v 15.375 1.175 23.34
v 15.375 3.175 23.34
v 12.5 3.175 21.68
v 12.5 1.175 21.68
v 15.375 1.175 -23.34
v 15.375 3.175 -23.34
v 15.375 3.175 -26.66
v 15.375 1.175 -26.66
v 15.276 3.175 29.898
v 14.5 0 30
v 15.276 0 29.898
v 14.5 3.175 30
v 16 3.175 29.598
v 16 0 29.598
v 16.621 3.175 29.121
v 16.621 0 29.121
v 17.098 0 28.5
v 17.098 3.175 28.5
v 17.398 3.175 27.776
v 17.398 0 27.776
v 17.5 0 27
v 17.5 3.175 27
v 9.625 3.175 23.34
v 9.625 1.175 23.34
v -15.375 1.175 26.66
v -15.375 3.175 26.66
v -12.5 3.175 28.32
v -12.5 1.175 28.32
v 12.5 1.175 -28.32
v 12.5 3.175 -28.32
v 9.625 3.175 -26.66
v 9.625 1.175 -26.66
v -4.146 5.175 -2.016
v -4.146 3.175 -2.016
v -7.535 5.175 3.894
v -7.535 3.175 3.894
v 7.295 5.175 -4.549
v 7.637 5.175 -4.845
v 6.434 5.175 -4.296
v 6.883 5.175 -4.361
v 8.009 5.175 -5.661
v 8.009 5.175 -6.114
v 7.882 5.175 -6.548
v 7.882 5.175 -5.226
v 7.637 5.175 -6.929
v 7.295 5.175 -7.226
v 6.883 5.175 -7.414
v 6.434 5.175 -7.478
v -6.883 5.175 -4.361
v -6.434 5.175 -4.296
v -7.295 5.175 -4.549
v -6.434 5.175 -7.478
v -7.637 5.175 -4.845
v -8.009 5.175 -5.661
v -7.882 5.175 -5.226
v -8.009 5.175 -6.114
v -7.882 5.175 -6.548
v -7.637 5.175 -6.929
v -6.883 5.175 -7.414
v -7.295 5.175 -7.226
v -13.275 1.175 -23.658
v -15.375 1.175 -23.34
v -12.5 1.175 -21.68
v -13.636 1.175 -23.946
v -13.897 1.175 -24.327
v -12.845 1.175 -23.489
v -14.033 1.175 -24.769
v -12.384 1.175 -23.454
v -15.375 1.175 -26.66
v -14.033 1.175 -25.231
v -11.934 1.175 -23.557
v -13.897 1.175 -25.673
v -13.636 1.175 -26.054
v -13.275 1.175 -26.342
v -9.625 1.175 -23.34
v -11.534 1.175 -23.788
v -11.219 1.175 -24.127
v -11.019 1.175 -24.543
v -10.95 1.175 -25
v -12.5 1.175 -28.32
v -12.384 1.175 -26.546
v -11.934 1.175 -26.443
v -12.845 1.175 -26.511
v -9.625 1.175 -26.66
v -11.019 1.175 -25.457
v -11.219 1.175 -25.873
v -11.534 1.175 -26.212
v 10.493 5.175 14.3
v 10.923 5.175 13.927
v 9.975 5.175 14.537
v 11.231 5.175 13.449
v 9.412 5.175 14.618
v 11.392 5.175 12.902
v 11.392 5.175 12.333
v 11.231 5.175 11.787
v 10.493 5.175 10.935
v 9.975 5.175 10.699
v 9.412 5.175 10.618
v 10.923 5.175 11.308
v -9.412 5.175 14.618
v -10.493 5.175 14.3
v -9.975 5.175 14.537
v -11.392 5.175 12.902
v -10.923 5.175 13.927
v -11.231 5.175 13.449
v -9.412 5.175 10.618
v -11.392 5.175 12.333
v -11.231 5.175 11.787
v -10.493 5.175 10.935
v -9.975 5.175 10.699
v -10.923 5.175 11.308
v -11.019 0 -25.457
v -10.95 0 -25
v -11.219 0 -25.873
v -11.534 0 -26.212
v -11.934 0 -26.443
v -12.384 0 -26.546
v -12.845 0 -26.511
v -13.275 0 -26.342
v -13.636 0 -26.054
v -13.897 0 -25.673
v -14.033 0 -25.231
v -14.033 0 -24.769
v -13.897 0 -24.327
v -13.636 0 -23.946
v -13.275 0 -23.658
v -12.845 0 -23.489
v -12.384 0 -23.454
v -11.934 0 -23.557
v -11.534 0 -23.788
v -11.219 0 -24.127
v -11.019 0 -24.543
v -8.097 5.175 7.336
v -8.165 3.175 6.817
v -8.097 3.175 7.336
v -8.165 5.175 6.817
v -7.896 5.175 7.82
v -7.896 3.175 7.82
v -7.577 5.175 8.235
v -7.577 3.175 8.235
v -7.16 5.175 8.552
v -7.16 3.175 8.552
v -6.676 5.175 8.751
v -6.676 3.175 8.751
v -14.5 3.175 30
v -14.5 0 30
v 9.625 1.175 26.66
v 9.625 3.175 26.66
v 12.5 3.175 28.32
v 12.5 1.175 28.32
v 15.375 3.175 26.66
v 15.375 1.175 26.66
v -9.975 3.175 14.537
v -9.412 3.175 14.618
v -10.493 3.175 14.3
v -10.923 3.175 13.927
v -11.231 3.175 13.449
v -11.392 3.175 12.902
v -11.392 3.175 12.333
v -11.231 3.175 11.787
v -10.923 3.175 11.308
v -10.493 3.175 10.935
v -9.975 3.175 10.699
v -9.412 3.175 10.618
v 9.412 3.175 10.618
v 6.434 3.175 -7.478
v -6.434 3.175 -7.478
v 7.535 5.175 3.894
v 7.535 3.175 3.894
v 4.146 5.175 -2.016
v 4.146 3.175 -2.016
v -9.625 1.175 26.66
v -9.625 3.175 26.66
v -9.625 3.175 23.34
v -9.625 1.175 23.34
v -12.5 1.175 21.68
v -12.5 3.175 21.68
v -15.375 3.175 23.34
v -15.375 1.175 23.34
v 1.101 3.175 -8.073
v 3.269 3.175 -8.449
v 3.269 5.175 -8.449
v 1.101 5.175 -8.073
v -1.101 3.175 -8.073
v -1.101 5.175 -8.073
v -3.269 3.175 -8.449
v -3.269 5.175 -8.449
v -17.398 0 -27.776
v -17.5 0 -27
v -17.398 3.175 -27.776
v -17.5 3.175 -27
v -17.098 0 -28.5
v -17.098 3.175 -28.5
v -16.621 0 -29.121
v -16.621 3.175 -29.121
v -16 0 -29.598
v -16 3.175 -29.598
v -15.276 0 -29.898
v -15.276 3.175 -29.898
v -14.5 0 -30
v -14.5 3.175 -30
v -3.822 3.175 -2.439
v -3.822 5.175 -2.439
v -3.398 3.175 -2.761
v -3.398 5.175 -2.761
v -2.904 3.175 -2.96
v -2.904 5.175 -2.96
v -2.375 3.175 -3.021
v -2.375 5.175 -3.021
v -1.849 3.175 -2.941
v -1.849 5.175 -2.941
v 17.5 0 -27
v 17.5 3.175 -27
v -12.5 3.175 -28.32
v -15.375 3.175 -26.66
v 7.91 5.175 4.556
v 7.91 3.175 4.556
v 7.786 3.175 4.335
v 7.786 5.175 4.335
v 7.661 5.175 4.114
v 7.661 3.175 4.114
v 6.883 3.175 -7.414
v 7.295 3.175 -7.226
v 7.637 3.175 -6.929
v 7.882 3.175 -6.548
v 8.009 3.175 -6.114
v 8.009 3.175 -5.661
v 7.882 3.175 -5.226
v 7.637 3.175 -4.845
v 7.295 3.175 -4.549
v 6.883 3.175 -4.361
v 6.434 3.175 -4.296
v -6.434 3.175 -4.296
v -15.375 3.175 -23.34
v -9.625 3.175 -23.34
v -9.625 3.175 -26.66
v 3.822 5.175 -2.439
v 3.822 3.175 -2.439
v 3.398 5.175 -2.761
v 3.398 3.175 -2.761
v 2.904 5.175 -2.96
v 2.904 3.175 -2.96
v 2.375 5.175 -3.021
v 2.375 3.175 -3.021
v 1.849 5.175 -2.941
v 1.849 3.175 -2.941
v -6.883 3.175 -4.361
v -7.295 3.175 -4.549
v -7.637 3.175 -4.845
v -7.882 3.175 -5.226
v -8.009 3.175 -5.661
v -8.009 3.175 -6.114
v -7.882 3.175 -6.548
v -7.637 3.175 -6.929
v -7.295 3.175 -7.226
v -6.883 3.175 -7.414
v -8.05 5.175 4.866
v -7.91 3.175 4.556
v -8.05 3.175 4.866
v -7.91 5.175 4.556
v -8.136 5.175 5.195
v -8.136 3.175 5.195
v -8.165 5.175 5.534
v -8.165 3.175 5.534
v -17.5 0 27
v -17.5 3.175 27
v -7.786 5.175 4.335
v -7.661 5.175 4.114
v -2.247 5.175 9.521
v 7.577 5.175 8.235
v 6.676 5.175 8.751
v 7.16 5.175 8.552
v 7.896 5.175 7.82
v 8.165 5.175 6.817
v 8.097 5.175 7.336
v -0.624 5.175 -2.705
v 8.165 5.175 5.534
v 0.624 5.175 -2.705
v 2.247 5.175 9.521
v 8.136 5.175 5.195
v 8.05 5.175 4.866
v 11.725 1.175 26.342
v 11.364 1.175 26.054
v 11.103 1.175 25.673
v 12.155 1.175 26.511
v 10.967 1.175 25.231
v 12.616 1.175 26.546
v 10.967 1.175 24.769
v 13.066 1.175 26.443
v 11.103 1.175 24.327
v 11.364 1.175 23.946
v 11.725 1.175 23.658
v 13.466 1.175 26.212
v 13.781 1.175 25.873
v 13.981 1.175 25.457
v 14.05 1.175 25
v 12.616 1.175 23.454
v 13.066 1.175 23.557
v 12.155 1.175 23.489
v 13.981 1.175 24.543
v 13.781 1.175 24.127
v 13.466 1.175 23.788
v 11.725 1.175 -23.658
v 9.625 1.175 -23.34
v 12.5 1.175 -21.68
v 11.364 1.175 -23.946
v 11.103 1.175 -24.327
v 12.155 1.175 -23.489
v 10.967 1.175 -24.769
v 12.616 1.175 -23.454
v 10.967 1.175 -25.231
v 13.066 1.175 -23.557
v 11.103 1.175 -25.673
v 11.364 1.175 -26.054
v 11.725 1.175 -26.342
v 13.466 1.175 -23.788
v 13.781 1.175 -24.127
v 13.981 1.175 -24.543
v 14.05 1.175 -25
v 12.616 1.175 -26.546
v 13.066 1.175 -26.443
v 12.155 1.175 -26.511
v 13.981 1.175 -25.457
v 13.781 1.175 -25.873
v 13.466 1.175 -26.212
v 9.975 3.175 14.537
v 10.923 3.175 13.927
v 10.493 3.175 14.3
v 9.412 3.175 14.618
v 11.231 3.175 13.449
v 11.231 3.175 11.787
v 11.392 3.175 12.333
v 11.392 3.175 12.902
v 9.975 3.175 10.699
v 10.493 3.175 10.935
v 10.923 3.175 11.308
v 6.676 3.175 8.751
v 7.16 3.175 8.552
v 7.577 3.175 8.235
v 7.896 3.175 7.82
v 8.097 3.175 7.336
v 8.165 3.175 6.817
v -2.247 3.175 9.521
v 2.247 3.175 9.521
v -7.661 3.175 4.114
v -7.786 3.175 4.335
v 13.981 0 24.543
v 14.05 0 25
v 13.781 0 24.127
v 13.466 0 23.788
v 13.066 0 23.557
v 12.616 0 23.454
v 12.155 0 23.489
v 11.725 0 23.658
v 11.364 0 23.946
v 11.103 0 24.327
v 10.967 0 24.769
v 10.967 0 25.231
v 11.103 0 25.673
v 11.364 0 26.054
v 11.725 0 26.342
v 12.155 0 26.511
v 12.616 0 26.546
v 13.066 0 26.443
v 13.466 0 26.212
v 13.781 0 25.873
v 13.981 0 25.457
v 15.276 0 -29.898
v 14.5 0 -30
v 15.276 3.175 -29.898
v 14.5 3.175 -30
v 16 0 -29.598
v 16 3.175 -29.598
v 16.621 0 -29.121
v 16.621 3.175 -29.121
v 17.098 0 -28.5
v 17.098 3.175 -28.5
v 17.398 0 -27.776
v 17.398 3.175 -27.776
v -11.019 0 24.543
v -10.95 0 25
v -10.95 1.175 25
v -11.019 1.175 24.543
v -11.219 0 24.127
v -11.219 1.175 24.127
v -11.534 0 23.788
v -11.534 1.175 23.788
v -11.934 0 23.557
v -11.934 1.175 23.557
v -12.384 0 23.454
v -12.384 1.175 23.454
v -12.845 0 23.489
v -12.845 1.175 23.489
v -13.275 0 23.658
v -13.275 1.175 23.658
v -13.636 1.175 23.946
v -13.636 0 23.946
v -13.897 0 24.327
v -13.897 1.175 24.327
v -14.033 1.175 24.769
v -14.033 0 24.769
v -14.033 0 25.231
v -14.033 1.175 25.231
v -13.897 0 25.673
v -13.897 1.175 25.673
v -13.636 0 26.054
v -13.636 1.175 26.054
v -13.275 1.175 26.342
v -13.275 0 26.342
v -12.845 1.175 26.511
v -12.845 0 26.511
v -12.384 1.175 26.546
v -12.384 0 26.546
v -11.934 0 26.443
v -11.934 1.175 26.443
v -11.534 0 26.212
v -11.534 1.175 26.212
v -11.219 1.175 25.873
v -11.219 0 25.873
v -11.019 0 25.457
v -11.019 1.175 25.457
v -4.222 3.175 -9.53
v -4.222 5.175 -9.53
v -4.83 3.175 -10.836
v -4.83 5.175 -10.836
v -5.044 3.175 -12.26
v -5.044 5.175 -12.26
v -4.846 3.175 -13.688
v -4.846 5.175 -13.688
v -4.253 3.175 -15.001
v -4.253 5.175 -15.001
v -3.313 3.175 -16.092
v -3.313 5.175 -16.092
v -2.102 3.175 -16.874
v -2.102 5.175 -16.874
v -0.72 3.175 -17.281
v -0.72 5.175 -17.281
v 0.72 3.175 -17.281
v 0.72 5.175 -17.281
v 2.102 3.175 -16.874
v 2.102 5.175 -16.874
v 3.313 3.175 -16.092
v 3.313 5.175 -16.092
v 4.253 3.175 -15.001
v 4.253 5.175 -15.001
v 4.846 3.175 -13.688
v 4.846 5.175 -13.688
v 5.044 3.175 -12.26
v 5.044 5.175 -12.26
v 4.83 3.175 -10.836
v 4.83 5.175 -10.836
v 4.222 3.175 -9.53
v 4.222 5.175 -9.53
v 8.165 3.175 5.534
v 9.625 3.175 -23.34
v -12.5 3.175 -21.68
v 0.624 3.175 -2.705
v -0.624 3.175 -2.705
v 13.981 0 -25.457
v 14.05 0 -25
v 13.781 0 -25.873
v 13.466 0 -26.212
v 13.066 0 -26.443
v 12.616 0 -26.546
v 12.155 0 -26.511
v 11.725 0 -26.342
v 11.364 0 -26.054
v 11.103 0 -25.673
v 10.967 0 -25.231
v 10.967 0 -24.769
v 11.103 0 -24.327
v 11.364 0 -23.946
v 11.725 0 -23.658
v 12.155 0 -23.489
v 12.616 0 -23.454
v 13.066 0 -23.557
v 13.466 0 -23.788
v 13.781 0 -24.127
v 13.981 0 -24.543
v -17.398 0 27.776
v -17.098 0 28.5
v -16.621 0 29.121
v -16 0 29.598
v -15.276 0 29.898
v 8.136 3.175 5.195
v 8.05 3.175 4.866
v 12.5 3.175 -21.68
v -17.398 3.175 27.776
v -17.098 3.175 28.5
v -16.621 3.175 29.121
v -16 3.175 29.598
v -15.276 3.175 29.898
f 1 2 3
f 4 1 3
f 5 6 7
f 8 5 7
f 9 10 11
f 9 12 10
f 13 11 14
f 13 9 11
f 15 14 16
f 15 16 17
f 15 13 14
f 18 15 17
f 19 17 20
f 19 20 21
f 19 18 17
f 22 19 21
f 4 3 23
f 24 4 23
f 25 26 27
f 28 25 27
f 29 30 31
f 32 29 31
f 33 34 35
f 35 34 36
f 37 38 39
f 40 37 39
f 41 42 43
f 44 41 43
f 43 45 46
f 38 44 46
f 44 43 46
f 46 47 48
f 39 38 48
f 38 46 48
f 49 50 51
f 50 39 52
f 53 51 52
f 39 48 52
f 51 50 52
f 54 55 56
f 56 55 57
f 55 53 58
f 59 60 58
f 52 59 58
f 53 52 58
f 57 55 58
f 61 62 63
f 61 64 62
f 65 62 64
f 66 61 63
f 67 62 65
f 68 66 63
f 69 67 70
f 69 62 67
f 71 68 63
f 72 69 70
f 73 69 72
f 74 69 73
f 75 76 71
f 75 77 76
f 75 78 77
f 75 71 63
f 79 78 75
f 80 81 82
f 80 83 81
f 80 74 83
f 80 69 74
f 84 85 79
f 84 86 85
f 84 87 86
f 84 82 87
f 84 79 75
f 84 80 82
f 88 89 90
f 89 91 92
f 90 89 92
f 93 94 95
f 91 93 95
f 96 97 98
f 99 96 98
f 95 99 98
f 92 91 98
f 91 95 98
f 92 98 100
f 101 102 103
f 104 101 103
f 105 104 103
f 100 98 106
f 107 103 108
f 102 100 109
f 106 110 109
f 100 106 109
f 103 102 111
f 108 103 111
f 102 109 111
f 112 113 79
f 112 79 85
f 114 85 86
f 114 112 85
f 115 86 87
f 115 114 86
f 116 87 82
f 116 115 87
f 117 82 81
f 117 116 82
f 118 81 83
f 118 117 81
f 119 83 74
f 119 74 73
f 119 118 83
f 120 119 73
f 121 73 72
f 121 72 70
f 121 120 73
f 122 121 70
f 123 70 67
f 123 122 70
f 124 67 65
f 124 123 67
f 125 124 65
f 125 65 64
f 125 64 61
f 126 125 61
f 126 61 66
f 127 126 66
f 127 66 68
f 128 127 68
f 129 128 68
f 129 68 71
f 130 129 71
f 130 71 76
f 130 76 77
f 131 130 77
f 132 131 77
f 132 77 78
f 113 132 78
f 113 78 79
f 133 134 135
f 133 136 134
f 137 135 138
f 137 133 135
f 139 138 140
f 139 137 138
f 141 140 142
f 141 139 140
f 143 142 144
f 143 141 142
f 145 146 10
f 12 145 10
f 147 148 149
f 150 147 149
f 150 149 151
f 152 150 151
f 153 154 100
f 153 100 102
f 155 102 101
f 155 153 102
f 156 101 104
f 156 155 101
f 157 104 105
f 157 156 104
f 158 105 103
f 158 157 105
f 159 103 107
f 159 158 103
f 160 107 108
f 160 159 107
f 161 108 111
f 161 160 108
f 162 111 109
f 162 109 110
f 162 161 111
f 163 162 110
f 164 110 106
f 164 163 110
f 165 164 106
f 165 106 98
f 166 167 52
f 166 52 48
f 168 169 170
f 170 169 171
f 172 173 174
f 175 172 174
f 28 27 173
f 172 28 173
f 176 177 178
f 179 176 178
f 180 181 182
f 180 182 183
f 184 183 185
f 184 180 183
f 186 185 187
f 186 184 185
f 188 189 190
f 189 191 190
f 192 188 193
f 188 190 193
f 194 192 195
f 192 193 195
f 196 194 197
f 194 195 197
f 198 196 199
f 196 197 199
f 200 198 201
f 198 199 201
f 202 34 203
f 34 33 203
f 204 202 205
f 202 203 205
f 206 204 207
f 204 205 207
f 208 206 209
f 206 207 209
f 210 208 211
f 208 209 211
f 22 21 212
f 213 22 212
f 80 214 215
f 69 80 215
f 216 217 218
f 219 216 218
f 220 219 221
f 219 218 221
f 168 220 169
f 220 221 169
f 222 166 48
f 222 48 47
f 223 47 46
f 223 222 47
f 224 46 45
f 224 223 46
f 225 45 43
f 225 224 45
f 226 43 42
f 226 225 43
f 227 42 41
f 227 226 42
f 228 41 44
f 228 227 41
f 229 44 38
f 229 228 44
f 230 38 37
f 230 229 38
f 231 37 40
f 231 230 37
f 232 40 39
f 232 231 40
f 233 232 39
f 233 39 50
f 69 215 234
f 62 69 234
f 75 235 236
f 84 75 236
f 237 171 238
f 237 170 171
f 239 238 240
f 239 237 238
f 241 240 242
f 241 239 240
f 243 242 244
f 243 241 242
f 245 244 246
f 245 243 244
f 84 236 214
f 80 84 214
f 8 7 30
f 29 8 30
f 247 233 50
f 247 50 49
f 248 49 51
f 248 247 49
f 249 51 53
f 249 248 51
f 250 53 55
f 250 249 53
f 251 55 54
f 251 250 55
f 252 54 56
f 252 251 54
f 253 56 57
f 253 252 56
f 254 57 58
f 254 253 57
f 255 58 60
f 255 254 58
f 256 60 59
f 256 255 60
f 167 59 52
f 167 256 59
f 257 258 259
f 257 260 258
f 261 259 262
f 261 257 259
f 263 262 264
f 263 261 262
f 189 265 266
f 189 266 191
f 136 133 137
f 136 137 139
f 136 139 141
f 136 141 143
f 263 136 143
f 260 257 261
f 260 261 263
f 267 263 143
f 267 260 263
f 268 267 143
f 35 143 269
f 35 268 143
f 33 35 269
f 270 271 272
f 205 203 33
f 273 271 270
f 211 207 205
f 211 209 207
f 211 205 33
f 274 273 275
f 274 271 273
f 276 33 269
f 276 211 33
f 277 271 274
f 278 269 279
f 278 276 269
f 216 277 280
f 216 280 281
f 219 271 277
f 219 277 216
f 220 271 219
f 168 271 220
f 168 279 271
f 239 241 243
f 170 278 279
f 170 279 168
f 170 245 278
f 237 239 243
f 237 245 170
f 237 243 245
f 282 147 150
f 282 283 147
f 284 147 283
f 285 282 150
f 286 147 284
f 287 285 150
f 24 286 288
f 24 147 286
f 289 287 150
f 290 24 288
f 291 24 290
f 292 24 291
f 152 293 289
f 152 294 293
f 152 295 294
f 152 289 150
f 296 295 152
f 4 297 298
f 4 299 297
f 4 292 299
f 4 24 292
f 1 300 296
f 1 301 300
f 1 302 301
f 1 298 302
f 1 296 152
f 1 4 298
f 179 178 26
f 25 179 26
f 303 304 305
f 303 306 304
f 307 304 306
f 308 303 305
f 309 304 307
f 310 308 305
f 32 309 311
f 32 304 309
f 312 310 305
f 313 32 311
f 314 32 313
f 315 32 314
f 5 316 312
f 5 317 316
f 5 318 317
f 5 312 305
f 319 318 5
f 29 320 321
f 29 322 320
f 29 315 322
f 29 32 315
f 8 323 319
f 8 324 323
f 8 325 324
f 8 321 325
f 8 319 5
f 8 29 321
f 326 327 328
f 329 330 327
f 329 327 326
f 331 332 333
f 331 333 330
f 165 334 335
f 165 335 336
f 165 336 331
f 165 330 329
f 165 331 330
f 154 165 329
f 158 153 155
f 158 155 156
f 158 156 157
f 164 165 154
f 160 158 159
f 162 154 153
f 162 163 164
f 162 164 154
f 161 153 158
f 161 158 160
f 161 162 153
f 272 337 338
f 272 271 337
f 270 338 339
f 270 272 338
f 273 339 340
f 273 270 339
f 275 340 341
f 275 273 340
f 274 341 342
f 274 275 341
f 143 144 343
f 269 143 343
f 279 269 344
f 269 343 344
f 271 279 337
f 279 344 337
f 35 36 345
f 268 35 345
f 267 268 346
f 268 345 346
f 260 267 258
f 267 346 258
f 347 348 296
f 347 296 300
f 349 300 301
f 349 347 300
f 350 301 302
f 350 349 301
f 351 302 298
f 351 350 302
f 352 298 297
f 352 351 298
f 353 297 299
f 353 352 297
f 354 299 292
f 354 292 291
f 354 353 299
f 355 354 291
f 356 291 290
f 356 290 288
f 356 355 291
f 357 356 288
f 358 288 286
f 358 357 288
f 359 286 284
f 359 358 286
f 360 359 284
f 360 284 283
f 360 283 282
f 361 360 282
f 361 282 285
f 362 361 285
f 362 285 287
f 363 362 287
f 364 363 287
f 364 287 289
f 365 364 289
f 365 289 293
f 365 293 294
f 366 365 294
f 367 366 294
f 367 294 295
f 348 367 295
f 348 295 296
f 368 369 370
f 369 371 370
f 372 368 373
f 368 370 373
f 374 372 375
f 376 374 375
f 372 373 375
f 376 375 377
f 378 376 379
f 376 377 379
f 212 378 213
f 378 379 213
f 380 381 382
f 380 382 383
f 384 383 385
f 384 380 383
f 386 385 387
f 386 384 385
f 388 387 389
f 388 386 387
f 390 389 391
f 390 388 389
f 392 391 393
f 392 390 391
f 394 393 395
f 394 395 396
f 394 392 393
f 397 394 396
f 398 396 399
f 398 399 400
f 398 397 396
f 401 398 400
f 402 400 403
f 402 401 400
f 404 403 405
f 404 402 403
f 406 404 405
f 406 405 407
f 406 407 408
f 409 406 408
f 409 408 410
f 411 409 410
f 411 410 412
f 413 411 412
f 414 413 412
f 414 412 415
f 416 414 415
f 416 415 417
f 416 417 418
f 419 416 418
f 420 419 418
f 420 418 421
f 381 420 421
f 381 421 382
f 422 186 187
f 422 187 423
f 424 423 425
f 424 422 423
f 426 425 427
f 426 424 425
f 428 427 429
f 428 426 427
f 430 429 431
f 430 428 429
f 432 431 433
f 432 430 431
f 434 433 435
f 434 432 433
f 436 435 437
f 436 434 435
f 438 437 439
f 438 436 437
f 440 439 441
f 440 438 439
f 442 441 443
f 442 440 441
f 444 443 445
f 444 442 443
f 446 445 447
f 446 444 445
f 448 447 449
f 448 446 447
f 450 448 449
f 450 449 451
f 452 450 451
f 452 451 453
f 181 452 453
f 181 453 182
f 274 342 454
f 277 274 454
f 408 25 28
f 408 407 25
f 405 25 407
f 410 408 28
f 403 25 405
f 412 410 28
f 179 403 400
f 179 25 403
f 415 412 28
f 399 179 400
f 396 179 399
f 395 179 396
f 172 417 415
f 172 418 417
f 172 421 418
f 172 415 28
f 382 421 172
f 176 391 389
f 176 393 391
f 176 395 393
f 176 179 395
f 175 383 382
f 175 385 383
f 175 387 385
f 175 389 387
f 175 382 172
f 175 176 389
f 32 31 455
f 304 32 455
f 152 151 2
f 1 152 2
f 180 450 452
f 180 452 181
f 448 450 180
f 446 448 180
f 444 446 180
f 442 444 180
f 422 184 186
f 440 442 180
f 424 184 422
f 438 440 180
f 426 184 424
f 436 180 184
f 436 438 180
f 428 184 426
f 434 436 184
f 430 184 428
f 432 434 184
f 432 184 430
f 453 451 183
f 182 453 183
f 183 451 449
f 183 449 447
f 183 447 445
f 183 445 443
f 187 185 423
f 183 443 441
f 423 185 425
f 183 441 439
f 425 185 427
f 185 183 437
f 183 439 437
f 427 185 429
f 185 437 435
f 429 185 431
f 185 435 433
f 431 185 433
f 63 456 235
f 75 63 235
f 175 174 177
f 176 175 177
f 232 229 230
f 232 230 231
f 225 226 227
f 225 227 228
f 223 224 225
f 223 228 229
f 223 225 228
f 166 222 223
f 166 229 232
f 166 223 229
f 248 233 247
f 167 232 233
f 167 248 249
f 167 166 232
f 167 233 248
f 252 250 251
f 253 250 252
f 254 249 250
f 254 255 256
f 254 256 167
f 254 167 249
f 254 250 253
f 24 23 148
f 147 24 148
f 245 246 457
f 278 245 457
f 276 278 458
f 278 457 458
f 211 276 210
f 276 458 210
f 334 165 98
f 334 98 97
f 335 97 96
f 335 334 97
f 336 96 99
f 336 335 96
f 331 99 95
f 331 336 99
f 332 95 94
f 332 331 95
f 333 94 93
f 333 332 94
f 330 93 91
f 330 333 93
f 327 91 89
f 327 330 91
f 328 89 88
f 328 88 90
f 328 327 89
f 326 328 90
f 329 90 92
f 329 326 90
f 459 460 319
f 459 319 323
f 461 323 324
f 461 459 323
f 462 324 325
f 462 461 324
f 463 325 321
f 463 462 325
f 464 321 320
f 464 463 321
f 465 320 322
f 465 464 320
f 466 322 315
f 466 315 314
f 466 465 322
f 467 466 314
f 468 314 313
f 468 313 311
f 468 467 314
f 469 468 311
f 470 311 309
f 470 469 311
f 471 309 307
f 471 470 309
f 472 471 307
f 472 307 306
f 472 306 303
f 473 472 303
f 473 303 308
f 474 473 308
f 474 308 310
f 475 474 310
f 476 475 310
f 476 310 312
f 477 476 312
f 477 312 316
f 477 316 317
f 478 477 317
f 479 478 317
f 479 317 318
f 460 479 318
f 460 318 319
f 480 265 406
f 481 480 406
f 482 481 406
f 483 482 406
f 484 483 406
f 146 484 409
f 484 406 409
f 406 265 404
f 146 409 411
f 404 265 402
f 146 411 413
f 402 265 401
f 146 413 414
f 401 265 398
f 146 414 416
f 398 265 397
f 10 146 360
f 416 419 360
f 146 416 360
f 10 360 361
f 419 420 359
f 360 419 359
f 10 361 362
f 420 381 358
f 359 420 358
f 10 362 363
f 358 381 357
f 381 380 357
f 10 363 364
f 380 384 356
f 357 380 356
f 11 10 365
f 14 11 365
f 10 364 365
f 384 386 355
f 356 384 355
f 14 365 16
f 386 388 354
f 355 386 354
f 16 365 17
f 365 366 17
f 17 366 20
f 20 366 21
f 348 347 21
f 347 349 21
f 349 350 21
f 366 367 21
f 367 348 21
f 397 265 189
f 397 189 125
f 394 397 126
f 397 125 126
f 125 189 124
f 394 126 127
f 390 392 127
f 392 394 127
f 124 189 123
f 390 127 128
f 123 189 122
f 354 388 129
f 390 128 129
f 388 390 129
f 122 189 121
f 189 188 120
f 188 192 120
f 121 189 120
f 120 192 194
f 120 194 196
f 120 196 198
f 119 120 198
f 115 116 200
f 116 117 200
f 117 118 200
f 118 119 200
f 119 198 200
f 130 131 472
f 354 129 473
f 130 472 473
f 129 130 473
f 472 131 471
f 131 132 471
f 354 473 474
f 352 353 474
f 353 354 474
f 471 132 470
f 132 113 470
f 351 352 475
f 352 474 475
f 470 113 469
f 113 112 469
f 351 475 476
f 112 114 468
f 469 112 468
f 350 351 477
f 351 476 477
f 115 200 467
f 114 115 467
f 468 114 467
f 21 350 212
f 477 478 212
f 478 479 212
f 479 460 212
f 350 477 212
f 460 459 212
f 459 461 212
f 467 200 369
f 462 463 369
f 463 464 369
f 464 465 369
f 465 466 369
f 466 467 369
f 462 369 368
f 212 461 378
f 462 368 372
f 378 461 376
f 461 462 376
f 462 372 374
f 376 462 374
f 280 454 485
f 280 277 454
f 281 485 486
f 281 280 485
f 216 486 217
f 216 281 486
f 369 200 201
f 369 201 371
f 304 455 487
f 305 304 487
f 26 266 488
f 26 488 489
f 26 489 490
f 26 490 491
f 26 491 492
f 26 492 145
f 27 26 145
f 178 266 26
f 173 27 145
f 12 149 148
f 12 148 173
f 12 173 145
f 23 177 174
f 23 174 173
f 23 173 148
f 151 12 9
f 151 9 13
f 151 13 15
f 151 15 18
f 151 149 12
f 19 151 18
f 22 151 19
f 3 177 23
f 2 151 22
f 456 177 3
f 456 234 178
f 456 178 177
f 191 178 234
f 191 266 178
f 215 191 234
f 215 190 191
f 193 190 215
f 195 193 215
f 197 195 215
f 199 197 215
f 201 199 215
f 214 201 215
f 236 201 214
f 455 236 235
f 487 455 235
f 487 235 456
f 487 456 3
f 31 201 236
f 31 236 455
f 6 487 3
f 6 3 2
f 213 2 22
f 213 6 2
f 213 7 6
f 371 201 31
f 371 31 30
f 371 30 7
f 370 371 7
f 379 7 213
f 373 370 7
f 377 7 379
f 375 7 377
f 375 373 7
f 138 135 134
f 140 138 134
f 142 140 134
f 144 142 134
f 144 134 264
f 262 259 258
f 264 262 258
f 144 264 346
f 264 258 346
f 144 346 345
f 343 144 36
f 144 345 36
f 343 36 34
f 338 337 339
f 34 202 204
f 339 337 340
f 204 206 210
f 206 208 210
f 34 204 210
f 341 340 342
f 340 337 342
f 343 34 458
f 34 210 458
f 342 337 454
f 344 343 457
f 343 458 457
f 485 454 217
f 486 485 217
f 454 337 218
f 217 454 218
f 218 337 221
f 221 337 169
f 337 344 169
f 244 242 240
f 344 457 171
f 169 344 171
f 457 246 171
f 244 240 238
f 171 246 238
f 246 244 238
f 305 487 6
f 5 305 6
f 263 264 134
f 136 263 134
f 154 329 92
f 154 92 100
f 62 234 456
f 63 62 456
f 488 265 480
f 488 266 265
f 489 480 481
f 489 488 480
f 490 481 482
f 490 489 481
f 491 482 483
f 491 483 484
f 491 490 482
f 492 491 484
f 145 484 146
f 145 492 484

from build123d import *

# Parameters (mm, degrees)
SKETCH1_W             = 35
SKETCH1_H             = 60
SKETCH1_R             = 1.55
BOSS_EXTRUDE1_DEPTH   = 3.175
CUT_EXTRUDE1_START    = 3.175
SKETCH1_3_R           = 1.55
CUT_EXTRUDE1_DEPTH    = 2
BOSS_EXTRUDE2_DEPTH   = 2
BOSS_EXTRUDE2_2_DEPTH = 2
BOSS_EXTRUDE2_3_DEPTH = 2
BOSS_EXTRUDE2_4_DEPTH = 2
FILLET1_R             = 2
FILLET2_R             = 3


with BuildPart() as part:
    # Sketch1 → Boss-Extrude1 (new body)
    with BuildSketch(Plane(origin=(0, 0, 0), x_dir=(1, 0, 0), z_dir=(0, 1, 0))):
        Rectangle(SKETCH1_W, SKETCH1_H)
        Polygon((15.375, -23.340117976), (12.5, -21.680235952), (9.625, -23.340117976), (9.625, -26.659882024), (12.5, -28.319764048), (15.375, -26.659882024), align=None, mode=Mode.SUBTRACT)
        Polygon((-15.375, -26.659882024), (-12.5, -28.319764048), (-9.625, -26.659882024), (-9.625, -23.340117976), (-12.5, -21.680235952), (-15.375, -23.340117976), align=None, mode=Mode.SUBTRACT)
        Polygon((15.375, 26.659882024), (12.5, 28.319764048), (9.625, 26.659882024), (9.625, 23.340117976), (12.5, 21.680235952), (15.375, 23.340117976), align=None, mode=Mode.SUBTRACT)
        Polygon((-9.625, 26.659882024), (-12.5, 28.319764048), (-15.375, 26.659882024), (-15.375, 23.340117976), (-12.5, 21.680235952), (-9.625, 23.340117976), align=None, mode=Mode.SUBTRACT)
        Polygon((-9.625, 23.340117976), (-9.625, 26.659882024), (-12.5, 28.319764048), (-15.375, 26.659882024), (-15.375, 23.340117976), (-12.5, 21.680235952), align=None)
        with Locations((-12.5, 25)):
            Circle(SKETCH1_R, mode=Mode.SUBTRACT)
        Polygon((15.375, 23.340117976), (15.375, 26.659882024), (12.5, 28.319764048), (9.625, 26.659882024), (9.625, 23.340117976), (12.5, 21.680235952), align=None)
        with Locations((12.5, 25)):
            Circle(SKETCH1_R, mode=Mode.SUBTRACT)
        Polygon((15.375, -26.659882024), (15.375, -23.340117976), (12.5, -21.680235952), (9.625, -23.340117976), (9.625, -26.659882024), (12.5, -28.319764048), align=None)
        with Locations((12.5, -25)):
            Circle(SKETCH1_R, mode=Mode.SUBTRACT)
        Polygon((-15.375, -23.340117976), (-15.375, -26.659882024), (-12.5, -28.319764048), (-9.625, -26.659882024), (-9.625, -23.340117976), (-12.5, -21.680235952), align=None)
        with Locations((-12.5, -25)):
            Circle(SKETCH1_R, mode=Mode.SUBTRACT)
    extrude(amount=BOSS_EXTRUDE1_DEPTH)

    # Sketch1<3> → Cut-Extrude1 (cut)
    with BuildSketch(Plane(origin=(0, 0, 0), x_dir=(1, 0, 0), z_dir=(0, 1, 0)).offset(CUT_EXTRUDE1_START)):
        Polygon((-15.375, -23.340117976), (-15.375, -26.659882024), (-12.5, -28.319764048), (-9.625, -26.659882024), (-9.625, -23.340117976), (-12.5, -21.680235952), align=None)
        with Locations((-12.5, -25)):
            Circle(SKETCH1_3_R, mode=Mode.SUBTRACT)
        Polygon((-9.625, 23.340117976), (-9.625, 26.659882024), (-12.5, 28.319764048), (-15.375, 26.659882024), (-15.375, 23.340117976), (-12.5, 21.680235952), align=None)
        with Locations((-12.5, 25)):
            Circle(SKETCH1_3_R, mode=Mode.SUBTRACT)
        Polygon((15.375, 23.340117976), (15.375, 26.659882024), (12.5, 28.319764048), (9.625, 26.659882024), (9.625, 23.340117976), (12.5, 21.680235952), align=None)
        with Locations((12.5, 25)):
            Circle(SKETCH1_3_R, mode=Mode.SUBTRACT)
        Polygon((15.375, -26.659882024), (15.375, -23.340117976), (12.5, -21.680235952), (9.625, -23.340117976), (9.625, -26.659882024), (12.5, -28.319764048), align=None)
        with Locations((12.5, -25)):
            Circle(SKETCH1_3_R, mode=Mode.SUBTRACT)
    extrude(amount=-CUT_EXTRUDE1_DEPTH, mode=Mode.SUBTRACT)

    # Fillet2
    fillet2_edges = [part.edges().sort_by_distance(p)[0] for p in [
        (-17.5, 1.5875, 30),
        (-17.5, 1.5875, -30),
        (17.5, 1.5875, -30),
        (17.5, 1.5875, 30),
    ]]
    fillet(fillet2_edges, radius=FILLET2_R)


with BuildPart() as body_2:
    # Sketch2 → Boss-Extrude2 (new body)
    with BuildSketch(Plane(origin=(0, 3.175, 0), x_dir=(1, 0, 0), z_dir=(0, 1, 0))):
        with BuildLine():
            Line((-3.269392663, 3.546359145), (-7.534974208, -3.894449428))
            ThreePointArc((-7.534974208, -3.894449428), (-7.852446436, -4.453420618), (-8.165429983, -5.014917462))
            Line((-8.165429983, -5.014917462), (-8.165429983, -8.310188106))
            ThreePointArc((-8.165429983, -8.310188106), (0, -9.6177262), (8.165429983, -8.310188106))
            Line((8.165429983, -8.310188106), (8.165429983, -5.014917462))
            ThreePointArc((8.165429983, -5.014917462), (7.852446436, -4.453420618), (7.534974208, -3.894449428))
            Line((7.534974208, -3.894449428), (3.269392663, 3.546359145))
            ThreePointArc((3.269392663, 3.546359145), (0, 2.675698868), (-3.269392663, 3.546359145))
        make_face()
    extrude(amount=BOSS_EXTRUDE2_DEPTH)

    # Fillet1
    fillet1_edges = [body_2.edges().sort_by_distance(p)[0] for p in [
        (-3.269392663, 4.175, -3.546359145),
        (3.269392663, 4.175, -3.546359145),
        (8.165429983, 4.175, 5.014917462),
        (8.165429983, 4.175, 8.310188106),
        (-8.165429983, 4.175, 8.310188106),
        (-8.165429983, 4.175, 5.014917462),
    ]]
    fillet(fillet1_edges, radius=FILLET1_R)


with BuildPart() as body_3:
    # Sketch2 → Boss-Extrude2 2 (new body)
    with BuildSketch(Plane(origin=(0, 3.175, 0), x_dir=(1, 0, 0), z_dir=(0, 1, 0))):
        with BuildLine():
            Line((-6.434445122, 7.478486551), (6.434445122, 7.478486551))
            ThreePointArc((6.434445122, 7.478486551), (8.025508824, 5.887422848), (6.434445122, 4.296359145))
            Line((6.434445122, 4.296359145), (-6.434445122, 4.296359145))
            ThreePointArc((-6.434445122, 4.296359145), (-8.025508824, 5.887422848), (-6.434445122, 7.478486551))
        make_face()
    extrude(amount=BOSS_EXTRUDE2_2_DEPTH)


with BuildPart() as body_4:
    # Sketch2 → Boss-Extrude2 3 (new body)
    with BuildSketch(Plane(origin=(0, 3.175, 0), x_dir=(1, 0, 0), z_dir=(0, 1, 0))):
        with BuildLine():
            Line((-9.411894665, -10.6177262), (9.411894665, -10.6177262))
            ThreePointArc((9.411894665, -10.6177262), (11.411894665, -12.6177262), (9.411894665, -14.6177262))
            Line((9.411894665, -14.6177262), (-9.411894665, -14.6177262))
            ThreePointArc((-9.411894665, -14.6177262), (-11.411894665, -12.6177262), (-9.411894665, -10.6177262))
        make_face()
    extrude(amount=BOSS_EXTRUDE2_3_DEPTH)


with BuildPart() as body_5:
    # Sketch2 → Boss-Extrude2 4 (new body)
    with BuildSketch(Plane(origin=(0, 3.175, 0), x_dir=(1, 0, 0), z_dir=(0, 1, 0))):
        with BuildLine():
            ThreePointArc((-3.269392663, 8.448517148), (0, 17.332791609), (3.269392663, 8.448517148))
            ThreePointArc((3.269392663, 8.448517148), (0, 8.025408307), (-3.269392663, 8.448517148))
        make_face()
    extrude(amount=BOSS_EXTRUDE2_4_DEPTH)


solid = Compound([part.part, body_2.part, body_3.part, body_4.part, body_5.part])
